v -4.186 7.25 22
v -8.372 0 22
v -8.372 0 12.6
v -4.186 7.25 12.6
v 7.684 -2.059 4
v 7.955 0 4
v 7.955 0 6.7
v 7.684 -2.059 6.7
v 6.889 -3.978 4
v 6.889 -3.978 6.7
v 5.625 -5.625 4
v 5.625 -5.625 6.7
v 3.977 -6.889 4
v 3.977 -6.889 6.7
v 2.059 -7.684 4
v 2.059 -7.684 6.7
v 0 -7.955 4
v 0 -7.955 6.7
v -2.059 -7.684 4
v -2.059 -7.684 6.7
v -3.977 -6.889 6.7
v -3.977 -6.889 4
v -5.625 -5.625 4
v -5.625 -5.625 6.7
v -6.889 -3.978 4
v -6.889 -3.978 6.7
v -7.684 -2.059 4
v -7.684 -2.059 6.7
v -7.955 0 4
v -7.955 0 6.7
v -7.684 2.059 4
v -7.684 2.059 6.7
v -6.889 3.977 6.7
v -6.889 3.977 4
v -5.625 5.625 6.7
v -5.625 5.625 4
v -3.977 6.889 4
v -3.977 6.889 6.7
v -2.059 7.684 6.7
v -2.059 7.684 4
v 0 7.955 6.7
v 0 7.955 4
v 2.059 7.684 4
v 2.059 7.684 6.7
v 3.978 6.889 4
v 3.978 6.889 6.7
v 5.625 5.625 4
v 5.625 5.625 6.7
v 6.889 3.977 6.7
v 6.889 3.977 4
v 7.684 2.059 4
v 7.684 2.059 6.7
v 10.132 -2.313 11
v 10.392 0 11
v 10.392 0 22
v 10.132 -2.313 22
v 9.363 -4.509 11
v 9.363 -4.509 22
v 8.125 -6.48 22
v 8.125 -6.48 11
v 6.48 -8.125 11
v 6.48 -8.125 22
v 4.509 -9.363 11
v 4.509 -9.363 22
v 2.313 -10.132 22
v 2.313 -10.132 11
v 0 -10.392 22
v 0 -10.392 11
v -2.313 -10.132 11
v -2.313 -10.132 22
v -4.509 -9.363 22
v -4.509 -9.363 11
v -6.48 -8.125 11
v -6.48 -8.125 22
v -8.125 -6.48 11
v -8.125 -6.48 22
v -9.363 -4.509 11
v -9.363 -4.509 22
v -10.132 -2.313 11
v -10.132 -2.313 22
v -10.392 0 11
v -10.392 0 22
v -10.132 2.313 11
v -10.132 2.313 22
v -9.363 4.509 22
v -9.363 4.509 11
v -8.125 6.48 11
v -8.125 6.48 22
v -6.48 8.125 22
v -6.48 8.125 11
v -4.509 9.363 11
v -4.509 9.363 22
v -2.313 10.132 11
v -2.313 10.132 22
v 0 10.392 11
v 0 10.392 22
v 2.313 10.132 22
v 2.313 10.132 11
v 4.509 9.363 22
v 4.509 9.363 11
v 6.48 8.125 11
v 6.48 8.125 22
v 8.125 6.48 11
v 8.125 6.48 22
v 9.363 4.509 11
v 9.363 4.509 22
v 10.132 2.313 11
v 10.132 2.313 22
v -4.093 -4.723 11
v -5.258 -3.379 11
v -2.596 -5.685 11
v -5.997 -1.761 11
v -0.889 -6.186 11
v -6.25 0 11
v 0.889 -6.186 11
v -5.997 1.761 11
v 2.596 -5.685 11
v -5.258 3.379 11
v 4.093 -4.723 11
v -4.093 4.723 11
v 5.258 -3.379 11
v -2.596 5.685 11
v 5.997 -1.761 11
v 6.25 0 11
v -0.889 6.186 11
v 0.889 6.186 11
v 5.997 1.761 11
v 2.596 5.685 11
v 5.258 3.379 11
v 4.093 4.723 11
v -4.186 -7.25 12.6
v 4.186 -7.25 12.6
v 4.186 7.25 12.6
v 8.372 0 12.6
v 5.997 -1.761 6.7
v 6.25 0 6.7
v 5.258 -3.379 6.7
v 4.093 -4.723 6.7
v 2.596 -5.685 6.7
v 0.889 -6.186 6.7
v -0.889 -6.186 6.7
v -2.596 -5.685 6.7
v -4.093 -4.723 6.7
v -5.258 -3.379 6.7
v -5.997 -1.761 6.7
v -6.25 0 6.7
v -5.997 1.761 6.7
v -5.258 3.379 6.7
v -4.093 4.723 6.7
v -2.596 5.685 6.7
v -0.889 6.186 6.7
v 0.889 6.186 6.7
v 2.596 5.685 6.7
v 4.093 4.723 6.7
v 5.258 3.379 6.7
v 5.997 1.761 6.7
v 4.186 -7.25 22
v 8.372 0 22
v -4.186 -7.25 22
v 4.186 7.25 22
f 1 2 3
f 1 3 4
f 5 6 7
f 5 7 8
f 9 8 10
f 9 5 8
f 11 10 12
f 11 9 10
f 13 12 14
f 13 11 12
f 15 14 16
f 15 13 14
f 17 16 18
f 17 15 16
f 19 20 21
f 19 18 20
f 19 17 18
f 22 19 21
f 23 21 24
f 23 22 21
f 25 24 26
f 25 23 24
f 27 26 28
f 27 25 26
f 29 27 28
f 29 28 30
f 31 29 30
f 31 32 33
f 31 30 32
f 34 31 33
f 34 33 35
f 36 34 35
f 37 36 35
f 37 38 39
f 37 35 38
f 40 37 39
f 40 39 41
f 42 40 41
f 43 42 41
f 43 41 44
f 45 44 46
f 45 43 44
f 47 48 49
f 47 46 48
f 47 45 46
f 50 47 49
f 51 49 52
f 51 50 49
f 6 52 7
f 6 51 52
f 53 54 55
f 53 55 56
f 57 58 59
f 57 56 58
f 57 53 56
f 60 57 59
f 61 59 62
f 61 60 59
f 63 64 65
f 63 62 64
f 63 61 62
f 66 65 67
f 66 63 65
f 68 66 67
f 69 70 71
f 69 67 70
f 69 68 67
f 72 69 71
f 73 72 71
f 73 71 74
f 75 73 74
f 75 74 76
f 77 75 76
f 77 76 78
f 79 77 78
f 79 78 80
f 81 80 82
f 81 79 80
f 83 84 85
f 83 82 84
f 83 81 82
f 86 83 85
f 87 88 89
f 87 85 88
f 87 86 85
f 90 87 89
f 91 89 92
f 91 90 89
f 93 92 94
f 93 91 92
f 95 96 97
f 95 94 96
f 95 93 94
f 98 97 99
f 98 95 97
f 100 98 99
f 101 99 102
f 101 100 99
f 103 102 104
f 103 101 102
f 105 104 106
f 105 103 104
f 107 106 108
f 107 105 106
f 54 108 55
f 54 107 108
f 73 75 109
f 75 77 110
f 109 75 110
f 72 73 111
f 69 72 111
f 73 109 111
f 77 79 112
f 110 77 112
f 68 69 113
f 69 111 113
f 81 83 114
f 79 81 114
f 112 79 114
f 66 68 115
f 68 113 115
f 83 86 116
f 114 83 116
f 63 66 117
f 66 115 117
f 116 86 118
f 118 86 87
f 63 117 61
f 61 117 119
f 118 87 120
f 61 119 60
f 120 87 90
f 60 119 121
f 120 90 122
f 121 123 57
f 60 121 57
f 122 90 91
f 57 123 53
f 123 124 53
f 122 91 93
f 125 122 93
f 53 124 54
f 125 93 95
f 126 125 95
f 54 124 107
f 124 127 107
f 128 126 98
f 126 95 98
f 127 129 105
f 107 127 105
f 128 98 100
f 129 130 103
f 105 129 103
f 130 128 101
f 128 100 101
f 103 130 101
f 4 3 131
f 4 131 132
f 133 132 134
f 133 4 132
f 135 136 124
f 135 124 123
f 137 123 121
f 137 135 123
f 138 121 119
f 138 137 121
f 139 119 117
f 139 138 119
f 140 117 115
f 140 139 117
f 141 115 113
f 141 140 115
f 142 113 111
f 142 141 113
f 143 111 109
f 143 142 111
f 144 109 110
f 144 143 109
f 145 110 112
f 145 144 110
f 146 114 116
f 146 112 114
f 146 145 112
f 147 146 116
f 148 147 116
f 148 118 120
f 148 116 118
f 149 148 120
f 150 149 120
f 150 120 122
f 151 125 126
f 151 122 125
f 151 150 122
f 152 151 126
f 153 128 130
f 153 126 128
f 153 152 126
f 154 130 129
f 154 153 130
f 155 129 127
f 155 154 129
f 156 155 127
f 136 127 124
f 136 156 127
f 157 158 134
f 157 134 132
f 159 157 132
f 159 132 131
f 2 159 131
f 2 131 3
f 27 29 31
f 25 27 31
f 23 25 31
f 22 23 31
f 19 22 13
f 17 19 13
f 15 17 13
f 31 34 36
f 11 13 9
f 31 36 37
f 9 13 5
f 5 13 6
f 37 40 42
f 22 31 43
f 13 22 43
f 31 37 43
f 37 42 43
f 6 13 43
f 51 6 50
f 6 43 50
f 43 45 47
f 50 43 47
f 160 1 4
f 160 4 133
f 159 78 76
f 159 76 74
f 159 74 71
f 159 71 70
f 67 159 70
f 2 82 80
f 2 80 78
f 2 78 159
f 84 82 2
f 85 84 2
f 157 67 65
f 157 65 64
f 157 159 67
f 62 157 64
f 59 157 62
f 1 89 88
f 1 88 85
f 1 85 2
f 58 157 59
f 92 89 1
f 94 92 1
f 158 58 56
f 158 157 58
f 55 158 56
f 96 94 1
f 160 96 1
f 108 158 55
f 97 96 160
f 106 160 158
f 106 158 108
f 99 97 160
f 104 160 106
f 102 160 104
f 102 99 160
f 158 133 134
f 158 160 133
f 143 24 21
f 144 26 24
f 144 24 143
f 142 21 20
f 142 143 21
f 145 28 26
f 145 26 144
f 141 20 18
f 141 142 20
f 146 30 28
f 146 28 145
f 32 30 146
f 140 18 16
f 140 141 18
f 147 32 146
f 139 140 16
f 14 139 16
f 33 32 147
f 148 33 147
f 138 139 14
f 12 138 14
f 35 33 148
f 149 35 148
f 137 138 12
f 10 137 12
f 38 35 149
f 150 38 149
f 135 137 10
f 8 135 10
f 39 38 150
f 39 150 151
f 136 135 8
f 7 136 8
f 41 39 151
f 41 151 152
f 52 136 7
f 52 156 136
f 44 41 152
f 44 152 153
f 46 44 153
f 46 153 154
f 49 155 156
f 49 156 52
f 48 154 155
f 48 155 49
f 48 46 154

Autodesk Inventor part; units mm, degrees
ref_plane "YZ Plane" through (0, 0, 0) normal (1, 0, 0) x (0, 1, 0)
ref_plane "XZ Plane" through (0, 0, 0) normal (0, 1, 0) x (-1, 0, 0)
ref_plane "XY Plane" through (0, 0, 0) normal (0, 0, 1) x (1, 0, 0)
ref_plane "Work Plane3" through (0, 0, 4) normal (0, 0, 1) x (1, 0, 0)
ref_plane "Work Plane4" through (0, 0, 11) normal (0, 0, -1) x (-1, 0, 0)
sketch "Sketch7" plane through (0, 0, 4) normal (0, 0, 1) x (1, 0, 0)
  circle A0 centre (0, 0) radius 3.5
  circle A1 centre (0, 0) radius 7.955
  dimension "d17" = 7
  dimension "d18" = 15.91
extrude "Extrusion5" add sketch "Sketch7" along normal blind 2.7 contours A0 | A1
sketch "Sketch8" plane through (0, 0, 6.7) normal (0, 0, 1) x (1, 0, 0)
  circle A0 centre (0, 0) radius 6.25
  dimension "d21" = 12.5
extrude "Extrusion6" add sketch "Sketch8" along normal up to surface (4.3 mm away)
sketch "Sketch9" plane through (0, 0, 11) normal (0, 0, 1) x (1, 0, 0)
  circle A0 centre (0, 0) radius 10.3925
  dimension "d24" = 20.785
extrude "Extrusion7" add sketch "Sketch9" along normal blind 11
sketch "Sketch10" plane through (0, 0, 22) normal (0, 0, 1) x (1, 0, 0)
  circle A0 centre (0, 0) radius 10.3925 projected
  line L0 (-4.1858, 7.25) -> (4.1858, 7.25)
  line L1 (4.1858, 7.25) -> (8.3716, 0)
  line L2 (8.3716, 0) -> (4.1858, -7.25)
  line L3 (4.1858, -7.25) -> (-4.1858, -7.25)
  line L4 (-4.1858, -7.25) -> (-8.3716, 0)
  line L5 (-8.3716, 0) -> (-4.1858, 7.25)
  line L6 (0, 0) -> (4.1858, 7.25) construction
  line L7 (0, 0) -> (8.3716, 0) construction
  line L8 (0, 0) -> (-4.1858, -7.25) construction
  line L9 (-14.5495, 0) -> (14.5495, 0) projected
  dimension "d27" = 14.5
extrude "Extrusion8" cut sketch "Sketch10" against normal blind 9.4 contours L9 L5 L0 L1 | L2 L3 L4 L9
properties part number "BlankSmallGearOutput"
